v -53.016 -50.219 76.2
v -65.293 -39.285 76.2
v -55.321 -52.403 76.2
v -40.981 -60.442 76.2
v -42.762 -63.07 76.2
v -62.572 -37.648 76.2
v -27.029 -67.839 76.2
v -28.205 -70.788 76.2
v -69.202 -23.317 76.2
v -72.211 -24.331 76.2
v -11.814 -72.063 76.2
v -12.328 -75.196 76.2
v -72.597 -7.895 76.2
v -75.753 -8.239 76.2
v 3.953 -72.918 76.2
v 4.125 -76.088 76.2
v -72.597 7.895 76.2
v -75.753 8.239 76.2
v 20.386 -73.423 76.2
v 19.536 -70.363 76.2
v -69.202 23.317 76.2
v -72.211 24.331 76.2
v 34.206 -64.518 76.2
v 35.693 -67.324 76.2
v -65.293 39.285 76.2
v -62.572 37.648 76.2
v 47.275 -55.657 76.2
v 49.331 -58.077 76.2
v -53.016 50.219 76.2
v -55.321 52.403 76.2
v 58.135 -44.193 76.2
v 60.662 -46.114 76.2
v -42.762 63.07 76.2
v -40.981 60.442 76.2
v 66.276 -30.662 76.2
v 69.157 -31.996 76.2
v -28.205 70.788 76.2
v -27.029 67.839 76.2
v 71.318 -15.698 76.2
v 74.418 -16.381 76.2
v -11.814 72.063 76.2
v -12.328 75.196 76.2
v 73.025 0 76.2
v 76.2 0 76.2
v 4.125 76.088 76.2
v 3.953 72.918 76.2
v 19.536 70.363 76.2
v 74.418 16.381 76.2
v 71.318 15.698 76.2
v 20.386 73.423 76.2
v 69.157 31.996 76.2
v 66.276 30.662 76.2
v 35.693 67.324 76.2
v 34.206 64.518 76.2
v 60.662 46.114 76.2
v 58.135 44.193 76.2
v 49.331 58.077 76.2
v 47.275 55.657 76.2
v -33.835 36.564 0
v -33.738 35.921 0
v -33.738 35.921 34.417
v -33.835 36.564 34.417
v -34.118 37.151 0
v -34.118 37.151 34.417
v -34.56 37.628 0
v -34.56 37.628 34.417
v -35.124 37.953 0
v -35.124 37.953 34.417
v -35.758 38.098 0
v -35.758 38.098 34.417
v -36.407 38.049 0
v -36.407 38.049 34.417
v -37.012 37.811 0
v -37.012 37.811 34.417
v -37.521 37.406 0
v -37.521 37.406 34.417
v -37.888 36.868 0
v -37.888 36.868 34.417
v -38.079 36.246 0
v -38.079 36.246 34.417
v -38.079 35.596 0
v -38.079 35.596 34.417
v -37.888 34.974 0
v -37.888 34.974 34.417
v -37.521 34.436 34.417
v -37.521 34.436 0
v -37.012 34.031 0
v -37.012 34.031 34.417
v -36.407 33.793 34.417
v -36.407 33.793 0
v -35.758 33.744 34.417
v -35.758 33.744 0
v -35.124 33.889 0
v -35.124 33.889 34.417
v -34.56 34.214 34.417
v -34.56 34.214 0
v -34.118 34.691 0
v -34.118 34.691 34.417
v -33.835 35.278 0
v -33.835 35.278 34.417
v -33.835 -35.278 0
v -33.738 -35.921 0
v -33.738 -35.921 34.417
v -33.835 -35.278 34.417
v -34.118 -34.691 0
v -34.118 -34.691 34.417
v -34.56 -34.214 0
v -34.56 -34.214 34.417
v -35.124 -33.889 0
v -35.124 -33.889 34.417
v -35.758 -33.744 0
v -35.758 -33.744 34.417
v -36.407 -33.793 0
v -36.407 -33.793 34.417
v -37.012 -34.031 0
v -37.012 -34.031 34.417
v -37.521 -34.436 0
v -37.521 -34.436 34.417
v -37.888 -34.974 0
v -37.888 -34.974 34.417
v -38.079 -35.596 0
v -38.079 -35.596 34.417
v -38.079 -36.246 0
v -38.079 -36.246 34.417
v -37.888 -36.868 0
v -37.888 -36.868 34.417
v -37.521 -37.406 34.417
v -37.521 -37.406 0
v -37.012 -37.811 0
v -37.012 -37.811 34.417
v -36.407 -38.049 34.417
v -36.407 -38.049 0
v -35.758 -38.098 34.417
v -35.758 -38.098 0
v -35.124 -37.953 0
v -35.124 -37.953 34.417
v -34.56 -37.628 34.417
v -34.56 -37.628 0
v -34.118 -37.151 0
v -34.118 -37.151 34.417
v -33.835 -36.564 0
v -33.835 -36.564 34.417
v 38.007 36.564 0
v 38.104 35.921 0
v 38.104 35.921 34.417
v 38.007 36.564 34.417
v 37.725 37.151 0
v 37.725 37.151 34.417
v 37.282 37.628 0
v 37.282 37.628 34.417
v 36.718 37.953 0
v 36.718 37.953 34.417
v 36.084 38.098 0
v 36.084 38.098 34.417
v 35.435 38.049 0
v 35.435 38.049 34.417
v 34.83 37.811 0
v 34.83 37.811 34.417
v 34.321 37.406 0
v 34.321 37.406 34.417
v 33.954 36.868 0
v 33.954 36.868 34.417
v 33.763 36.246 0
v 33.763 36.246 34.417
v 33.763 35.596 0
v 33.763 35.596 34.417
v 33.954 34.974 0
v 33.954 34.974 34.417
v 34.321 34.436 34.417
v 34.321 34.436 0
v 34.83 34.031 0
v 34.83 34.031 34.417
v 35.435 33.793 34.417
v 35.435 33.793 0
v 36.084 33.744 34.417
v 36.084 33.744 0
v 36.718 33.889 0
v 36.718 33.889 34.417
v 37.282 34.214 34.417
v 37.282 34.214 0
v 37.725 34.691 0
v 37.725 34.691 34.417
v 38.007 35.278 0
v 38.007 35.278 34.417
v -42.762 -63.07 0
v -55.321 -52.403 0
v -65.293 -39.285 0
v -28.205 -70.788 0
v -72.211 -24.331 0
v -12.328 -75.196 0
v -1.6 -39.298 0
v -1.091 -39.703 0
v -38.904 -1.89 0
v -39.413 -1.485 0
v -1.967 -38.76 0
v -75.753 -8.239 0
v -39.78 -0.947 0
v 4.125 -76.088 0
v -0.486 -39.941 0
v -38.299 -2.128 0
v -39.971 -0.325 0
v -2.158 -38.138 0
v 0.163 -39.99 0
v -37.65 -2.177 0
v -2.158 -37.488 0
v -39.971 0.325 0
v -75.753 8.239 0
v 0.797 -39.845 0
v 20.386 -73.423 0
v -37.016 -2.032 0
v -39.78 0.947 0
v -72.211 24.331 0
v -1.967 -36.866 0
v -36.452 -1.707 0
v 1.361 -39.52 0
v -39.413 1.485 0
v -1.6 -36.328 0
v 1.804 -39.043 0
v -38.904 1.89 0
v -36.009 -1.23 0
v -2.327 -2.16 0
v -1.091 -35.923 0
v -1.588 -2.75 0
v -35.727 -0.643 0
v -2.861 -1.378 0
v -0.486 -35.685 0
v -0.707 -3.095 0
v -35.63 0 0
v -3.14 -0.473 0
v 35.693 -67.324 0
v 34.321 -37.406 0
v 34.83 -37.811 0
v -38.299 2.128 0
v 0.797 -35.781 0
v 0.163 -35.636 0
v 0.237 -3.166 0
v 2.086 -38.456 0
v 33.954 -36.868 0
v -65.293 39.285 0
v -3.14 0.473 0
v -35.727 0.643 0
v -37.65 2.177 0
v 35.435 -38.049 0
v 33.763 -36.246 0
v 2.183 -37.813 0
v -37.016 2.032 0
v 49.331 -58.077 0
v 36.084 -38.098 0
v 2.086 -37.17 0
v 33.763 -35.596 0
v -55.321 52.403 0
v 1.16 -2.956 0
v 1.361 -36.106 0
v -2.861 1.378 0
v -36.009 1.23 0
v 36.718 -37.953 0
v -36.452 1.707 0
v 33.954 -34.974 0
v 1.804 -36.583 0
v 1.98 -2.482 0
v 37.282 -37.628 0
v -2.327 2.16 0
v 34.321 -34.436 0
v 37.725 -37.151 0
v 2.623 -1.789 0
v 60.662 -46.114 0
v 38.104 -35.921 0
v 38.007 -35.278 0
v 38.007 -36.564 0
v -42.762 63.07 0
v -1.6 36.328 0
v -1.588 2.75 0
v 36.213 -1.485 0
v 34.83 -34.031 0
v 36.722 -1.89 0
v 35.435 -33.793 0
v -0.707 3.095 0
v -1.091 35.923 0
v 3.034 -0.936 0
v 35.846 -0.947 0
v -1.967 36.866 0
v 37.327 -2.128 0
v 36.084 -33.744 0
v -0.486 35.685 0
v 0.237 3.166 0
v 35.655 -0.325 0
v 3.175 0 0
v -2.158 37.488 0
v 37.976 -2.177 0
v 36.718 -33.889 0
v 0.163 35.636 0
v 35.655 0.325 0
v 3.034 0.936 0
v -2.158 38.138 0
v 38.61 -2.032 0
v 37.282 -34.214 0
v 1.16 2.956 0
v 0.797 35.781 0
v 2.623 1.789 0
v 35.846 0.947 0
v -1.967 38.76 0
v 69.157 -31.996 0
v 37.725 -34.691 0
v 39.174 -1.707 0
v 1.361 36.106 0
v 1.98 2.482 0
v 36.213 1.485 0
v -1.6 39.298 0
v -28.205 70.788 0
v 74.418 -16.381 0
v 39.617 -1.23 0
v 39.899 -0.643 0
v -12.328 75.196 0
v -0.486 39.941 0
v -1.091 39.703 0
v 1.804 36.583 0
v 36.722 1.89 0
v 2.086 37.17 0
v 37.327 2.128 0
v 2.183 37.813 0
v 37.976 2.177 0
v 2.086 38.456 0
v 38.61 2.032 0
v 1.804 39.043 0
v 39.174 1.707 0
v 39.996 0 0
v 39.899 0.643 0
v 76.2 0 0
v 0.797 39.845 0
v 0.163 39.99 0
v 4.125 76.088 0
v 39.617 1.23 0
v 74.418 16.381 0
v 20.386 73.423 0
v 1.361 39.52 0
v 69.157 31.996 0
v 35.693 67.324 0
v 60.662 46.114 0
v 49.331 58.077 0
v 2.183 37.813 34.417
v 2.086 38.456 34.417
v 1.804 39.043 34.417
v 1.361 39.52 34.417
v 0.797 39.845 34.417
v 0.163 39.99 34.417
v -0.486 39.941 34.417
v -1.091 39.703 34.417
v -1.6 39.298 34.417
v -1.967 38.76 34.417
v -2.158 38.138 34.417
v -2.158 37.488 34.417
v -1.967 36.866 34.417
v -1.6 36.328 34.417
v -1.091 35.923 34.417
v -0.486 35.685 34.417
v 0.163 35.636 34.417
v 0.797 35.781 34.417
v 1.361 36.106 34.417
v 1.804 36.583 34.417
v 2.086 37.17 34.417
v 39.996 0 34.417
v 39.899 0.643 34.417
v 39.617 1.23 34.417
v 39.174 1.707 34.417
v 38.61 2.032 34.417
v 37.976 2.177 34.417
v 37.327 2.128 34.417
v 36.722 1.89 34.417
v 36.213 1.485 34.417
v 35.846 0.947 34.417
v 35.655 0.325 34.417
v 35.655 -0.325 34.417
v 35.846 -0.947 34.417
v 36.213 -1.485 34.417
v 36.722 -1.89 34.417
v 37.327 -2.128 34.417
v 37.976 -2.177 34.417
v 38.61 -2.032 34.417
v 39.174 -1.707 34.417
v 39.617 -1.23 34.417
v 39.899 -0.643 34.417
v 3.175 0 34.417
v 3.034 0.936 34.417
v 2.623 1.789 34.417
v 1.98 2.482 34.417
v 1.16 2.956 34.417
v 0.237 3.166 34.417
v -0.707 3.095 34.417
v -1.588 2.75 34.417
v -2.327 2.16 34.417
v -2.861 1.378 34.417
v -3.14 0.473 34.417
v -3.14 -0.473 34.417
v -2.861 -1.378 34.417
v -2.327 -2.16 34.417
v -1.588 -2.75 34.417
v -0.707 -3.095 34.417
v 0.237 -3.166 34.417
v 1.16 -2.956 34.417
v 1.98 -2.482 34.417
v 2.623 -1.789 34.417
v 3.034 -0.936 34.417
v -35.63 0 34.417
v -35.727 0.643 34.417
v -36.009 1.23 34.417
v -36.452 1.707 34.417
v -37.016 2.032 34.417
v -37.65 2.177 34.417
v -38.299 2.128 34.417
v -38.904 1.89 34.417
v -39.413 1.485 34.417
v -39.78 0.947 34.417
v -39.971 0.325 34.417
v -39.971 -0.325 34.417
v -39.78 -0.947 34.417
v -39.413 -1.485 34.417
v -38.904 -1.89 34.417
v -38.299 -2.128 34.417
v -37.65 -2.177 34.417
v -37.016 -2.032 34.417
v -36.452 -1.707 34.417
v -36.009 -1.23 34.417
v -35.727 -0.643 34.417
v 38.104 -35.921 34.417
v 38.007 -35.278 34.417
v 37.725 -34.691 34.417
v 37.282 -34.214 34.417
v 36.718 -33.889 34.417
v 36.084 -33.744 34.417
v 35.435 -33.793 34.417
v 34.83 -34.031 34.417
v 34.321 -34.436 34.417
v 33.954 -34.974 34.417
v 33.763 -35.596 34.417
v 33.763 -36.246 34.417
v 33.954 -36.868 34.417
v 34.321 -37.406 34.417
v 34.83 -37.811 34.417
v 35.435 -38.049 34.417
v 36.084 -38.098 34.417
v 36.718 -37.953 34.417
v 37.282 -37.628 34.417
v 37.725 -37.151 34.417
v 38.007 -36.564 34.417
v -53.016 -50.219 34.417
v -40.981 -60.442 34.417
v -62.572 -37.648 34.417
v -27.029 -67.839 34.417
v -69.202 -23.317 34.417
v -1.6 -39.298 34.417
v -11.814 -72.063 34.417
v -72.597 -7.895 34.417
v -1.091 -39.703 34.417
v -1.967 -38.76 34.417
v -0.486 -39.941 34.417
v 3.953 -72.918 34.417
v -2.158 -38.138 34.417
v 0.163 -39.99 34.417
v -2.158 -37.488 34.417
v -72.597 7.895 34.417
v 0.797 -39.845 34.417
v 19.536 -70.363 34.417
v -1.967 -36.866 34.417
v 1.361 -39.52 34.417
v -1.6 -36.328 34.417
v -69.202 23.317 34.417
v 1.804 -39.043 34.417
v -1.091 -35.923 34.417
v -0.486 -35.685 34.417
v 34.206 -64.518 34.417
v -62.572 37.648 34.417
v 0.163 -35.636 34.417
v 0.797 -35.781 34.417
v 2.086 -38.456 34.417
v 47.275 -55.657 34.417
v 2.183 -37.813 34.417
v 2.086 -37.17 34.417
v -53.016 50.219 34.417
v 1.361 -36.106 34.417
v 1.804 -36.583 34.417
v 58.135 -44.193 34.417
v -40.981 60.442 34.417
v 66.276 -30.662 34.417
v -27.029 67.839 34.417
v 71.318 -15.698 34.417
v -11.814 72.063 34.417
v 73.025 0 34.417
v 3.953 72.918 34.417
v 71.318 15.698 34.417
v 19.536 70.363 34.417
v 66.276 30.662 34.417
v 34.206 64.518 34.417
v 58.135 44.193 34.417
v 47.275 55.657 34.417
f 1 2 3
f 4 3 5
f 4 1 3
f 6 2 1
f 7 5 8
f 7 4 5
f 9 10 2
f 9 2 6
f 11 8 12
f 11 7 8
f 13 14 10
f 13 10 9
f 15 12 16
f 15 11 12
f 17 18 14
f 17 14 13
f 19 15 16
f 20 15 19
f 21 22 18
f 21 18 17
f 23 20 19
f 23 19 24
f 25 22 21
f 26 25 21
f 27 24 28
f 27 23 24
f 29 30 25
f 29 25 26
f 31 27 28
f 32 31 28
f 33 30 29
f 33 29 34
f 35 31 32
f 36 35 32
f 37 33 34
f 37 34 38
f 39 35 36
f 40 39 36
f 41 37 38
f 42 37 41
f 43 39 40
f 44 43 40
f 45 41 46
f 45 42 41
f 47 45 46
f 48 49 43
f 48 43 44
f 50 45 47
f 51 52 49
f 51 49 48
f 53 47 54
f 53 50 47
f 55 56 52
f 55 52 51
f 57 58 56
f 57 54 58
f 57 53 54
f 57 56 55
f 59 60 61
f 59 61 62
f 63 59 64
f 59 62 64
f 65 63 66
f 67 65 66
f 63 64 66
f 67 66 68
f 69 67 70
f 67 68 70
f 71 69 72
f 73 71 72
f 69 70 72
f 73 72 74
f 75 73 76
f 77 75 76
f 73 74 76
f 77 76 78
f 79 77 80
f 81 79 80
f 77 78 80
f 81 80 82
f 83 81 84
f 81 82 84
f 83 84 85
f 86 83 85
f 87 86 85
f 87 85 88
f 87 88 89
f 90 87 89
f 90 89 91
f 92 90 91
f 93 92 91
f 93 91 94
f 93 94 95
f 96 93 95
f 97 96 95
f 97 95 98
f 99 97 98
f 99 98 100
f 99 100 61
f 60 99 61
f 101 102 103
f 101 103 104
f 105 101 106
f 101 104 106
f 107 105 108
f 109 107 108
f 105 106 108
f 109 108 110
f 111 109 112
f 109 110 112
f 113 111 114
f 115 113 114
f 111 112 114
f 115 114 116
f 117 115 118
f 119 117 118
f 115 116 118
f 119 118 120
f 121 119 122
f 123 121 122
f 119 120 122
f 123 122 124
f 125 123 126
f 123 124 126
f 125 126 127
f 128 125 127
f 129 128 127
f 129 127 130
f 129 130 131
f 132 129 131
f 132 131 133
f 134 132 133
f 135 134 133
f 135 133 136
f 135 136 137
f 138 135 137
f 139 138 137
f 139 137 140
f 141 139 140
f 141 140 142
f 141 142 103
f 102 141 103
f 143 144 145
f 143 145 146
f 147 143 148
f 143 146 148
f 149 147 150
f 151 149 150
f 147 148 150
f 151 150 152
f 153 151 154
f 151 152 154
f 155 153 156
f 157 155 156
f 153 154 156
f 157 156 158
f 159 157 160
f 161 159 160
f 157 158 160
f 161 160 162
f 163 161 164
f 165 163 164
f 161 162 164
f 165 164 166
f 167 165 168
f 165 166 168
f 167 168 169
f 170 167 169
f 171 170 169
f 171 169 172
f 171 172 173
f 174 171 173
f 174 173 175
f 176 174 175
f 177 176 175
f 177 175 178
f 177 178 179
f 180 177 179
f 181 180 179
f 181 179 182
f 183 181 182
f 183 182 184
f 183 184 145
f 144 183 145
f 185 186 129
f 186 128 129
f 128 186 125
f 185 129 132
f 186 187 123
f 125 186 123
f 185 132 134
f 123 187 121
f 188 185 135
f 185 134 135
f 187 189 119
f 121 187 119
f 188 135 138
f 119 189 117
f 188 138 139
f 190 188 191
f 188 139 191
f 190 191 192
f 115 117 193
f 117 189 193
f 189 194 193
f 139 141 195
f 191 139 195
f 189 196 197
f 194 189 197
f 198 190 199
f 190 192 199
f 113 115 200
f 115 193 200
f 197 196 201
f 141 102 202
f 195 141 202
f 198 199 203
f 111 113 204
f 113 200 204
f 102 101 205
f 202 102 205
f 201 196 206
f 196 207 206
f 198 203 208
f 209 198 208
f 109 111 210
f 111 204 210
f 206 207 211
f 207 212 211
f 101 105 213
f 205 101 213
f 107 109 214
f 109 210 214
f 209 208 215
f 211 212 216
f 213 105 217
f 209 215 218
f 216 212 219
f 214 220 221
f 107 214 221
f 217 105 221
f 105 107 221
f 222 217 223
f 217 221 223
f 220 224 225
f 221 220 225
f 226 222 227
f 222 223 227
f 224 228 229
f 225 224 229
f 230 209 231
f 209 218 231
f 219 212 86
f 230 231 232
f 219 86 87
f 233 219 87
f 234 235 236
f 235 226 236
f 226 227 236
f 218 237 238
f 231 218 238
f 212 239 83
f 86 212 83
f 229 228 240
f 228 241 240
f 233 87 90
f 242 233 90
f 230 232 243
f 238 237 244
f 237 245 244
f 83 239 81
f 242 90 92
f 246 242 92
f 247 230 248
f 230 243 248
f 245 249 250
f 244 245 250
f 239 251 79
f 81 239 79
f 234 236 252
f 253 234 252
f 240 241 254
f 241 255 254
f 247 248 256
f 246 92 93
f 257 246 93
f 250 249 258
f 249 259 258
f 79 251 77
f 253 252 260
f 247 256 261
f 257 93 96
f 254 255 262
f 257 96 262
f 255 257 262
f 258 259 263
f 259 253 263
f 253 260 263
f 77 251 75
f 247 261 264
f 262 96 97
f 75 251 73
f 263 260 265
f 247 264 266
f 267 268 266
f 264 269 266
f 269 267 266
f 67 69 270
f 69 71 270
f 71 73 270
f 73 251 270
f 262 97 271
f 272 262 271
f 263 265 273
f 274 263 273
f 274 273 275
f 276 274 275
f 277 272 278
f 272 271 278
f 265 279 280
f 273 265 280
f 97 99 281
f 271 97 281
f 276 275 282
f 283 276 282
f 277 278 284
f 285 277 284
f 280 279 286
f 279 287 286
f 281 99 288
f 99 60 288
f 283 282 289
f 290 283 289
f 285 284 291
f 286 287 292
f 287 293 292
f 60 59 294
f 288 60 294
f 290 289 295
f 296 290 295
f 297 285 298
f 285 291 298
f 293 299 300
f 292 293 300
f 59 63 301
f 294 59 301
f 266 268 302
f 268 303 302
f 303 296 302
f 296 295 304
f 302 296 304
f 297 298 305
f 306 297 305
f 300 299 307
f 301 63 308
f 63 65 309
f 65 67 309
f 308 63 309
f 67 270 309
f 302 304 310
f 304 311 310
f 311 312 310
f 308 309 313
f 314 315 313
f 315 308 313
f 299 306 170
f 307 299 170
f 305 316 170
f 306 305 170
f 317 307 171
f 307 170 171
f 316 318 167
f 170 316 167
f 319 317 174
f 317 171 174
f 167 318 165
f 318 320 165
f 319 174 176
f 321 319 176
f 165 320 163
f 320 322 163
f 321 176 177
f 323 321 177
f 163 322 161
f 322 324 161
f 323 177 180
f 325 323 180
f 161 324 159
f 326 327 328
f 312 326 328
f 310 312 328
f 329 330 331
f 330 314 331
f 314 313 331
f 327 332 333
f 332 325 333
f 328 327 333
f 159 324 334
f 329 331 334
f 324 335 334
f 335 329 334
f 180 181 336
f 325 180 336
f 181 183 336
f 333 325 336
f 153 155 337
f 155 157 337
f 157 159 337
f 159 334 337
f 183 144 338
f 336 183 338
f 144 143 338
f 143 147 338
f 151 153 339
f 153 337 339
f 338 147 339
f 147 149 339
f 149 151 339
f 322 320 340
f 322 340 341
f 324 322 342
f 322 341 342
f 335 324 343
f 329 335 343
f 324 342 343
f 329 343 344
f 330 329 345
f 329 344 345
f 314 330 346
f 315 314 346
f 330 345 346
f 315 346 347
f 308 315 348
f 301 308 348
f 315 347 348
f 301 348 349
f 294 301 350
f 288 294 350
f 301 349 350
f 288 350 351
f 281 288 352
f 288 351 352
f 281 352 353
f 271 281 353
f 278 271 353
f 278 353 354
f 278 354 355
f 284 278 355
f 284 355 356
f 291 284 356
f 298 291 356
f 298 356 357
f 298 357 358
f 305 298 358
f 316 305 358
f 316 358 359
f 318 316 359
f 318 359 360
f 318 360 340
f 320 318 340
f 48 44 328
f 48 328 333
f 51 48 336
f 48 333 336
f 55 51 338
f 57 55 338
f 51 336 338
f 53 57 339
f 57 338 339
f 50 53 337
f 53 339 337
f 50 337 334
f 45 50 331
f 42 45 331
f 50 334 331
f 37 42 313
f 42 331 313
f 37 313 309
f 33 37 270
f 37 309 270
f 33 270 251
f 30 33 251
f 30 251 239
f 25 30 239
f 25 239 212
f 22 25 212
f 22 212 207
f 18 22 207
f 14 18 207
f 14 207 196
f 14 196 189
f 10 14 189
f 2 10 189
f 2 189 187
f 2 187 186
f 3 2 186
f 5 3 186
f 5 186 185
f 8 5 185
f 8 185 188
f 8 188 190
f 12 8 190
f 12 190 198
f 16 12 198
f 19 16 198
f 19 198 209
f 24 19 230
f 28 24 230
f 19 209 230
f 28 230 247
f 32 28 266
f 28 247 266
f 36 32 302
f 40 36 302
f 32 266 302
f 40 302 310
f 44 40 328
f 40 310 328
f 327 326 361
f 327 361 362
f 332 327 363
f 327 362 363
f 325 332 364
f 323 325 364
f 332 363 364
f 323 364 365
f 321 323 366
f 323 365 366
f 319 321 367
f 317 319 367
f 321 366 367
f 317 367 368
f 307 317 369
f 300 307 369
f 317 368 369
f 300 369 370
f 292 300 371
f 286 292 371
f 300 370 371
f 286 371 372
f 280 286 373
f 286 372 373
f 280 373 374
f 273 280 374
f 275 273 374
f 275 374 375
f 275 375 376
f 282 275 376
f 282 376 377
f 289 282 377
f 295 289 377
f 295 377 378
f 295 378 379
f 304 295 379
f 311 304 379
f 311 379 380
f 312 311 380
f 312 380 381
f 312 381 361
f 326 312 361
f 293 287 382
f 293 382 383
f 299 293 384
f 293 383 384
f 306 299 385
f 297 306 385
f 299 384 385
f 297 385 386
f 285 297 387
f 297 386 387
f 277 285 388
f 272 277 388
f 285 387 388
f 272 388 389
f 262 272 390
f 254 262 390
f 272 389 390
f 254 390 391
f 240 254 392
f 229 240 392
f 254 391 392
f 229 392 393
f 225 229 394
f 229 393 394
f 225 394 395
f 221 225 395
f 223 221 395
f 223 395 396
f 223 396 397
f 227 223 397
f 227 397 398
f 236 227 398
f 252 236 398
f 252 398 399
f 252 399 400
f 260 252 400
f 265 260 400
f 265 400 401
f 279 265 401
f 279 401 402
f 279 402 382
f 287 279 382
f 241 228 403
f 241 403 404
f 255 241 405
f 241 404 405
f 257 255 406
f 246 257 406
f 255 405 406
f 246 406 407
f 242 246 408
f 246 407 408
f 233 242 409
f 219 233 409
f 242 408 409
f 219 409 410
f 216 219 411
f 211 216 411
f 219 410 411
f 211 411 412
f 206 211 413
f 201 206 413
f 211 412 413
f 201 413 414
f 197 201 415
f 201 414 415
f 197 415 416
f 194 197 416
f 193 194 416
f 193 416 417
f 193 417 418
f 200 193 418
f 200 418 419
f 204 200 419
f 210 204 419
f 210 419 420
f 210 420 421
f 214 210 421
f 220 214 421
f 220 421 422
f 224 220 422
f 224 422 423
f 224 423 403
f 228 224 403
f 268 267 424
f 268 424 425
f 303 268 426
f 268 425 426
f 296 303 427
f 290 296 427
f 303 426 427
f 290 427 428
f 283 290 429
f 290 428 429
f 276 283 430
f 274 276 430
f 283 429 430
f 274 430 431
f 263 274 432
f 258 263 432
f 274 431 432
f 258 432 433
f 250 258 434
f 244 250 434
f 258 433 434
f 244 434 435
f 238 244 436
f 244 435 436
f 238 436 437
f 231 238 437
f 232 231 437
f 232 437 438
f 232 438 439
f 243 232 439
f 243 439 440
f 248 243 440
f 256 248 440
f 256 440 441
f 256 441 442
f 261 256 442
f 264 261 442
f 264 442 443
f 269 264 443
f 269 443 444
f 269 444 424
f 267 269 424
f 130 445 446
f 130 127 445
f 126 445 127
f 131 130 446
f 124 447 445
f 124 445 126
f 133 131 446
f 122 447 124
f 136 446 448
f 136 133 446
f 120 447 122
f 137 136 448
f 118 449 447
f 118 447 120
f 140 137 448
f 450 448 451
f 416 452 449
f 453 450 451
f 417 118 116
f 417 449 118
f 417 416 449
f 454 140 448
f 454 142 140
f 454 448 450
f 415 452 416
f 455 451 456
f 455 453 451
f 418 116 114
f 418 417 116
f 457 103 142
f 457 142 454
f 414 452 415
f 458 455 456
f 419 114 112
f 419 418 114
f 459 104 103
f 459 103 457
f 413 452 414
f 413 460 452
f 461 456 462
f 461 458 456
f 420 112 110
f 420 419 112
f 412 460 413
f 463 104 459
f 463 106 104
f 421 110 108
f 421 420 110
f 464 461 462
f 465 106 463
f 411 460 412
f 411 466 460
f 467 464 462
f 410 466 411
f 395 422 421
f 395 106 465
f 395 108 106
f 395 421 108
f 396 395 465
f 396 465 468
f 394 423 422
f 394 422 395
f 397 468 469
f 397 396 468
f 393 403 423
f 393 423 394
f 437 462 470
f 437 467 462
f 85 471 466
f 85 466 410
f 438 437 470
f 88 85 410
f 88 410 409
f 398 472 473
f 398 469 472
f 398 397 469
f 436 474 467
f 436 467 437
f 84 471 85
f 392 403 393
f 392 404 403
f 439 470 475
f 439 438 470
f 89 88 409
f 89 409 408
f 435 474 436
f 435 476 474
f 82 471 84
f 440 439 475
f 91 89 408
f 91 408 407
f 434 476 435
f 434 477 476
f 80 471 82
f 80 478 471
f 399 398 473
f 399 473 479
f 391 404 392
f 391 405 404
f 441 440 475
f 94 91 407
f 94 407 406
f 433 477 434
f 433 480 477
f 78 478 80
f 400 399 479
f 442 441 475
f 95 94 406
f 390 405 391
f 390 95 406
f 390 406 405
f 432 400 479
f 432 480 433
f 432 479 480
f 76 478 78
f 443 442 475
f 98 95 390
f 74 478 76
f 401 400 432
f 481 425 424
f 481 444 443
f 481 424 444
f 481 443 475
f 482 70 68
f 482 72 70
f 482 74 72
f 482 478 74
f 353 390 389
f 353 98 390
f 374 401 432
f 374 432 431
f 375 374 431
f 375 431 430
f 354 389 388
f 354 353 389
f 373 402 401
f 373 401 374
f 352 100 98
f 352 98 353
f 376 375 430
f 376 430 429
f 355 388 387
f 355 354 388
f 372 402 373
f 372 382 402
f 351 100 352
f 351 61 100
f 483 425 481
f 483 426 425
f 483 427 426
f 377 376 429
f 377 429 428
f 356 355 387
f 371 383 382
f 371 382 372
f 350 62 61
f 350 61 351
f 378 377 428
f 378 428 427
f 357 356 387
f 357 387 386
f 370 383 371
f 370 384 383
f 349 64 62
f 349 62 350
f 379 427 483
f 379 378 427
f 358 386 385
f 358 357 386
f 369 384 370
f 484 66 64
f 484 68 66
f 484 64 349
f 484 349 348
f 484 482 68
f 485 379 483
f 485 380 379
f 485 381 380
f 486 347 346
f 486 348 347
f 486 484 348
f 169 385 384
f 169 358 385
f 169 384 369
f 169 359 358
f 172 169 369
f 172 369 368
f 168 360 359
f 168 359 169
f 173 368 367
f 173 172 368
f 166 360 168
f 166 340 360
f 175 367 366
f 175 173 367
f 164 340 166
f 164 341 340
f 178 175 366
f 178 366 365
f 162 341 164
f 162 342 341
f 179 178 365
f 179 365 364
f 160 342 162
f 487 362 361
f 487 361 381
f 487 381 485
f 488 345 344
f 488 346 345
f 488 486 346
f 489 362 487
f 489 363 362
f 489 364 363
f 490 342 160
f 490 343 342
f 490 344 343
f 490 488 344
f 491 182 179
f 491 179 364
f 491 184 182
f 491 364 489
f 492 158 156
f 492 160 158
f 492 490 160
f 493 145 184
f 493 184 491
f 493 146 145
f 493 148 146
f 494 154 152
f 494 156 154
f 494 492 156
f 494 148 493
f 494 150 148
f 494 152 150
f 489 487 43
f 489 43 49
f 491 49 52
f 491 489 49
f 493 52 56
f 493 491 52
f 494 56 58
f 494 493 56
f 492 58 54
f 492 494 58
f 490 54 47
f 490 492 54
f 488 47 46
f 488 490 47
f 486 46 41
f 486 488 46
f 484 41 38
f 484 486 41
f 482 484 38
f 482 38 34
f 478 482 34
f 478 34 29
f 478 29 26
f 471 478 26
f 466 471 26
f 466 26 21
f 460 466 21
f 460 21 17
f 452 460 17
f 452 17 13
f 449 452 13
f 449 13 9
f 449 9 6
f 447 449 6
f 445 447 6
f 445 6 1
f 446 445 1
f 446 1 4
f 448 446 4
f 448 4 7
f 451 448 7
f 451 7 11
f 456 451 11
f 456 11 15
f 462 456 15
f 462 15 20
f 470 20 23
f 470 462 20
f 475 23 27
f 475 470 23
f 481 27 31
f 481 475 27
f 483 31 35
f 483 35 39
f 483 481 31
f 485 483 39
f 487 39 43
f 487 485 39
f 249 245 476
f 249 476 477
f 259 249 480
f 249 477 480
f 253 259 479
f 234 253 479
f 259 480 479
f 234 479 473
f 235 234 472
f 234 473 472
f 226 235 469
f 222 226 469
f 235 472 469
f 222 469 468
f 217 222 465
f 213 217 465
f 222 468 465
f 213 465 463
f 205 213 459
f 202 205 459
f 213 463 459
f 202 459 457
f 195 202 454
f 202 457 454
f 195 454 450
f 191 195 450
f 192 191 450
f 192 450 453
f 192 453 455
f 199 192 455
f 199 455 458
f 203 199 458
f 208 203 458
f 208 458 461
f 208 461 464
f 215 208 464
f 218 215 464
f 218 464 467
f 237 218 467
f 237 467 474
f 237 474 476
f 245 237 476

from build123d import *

# Parameters (mm, degrees)
SKETCH1_R           = 76.2
SKETCH1_R_2         = 73.025
BOSS_EXTRUDE1_DEPTH = 76.2
SKETCH3_R           = 76.2
BOSS_EXTRUDE2_DEPTH = 34.417
SKETCH5_R           = 2.1828125
CUT_EXTRUDE2_DEPTH  = 35.417
SKETCH11_R          = 2.1828125
CUT_EXTRUDE11_DEPTH = 35.417
SKETCH12_R          = 3.175
CUT_EXTRUDE12_DEPTH = 35.417


with BuildPart() as part:
    # Sketch1 → Boss-Extrude1 (new body)
    with BuildSketch(Plane.XY):
        Circle(SKETCH1_R)
        Circle(SKETCH1_R_2, mode=Mode.SUBTRACT)
    extrude(amount=BOSS_EXTRUDE1_DEPTH)

    # Sketch3 → Boss-Extrude2 (add)
    with BuildSketch(Plane.XY):
        Circle(SKETCH3_R)
    extrude(amount=BOSS_EXTRUDE2_DEPTH)

    # Sketch5 → Cut-Extrude2 (cut, through all)
    with BuildSketch(Plane.XY.offset(34.417)):
        with Locations((0, 37.81298)):
            Circle(SKETCH5_R)
        with Locations((37.81298, 0)):
            Circle(SKETCH5_R)
        with Locations((-37.81298, 0)):
            Circle(SKETCH5_R)
        with Locations((0, -37.81298)):
            Circle(SKETCH5_R)
    extrude(amount=-CUT_EXTRUDE2_DEPTH, mode=Mode.SUBTRACT)

    # Sketch11 → Cut-Extrude11 (cut, through all)
    with BuildSketch(Plane.XY.offset(34.417)):
        with Locations((-35.921024484, 35.921024484)):
            Circle(SKETCH11_R)
        with Locations((-35.921024484, -35.921024484)):
            Circle(SKETCH11_R)
        with Locations((35.921024484, -35.921024484)):
            Circle(SKETCH11_R)
        with Locations((35.921024484, 35.921024484)):
            Circle(SKETCH11_R)
    extrude(amount=-CUT_EXTRUDE11_DEPTH, mode=Mode.SUBTRACT)

    # Sketch12 → Cut-Extrude12 (cut, through all)
    with BuildSketch(Plane.XY.offset(34.417)):
        Circle(SKETCH12_R)
    extrude(amount=-CUT_EXTRUDE12_DEPTH, mode=Mode.SUBTRACT)


solid = part.part
